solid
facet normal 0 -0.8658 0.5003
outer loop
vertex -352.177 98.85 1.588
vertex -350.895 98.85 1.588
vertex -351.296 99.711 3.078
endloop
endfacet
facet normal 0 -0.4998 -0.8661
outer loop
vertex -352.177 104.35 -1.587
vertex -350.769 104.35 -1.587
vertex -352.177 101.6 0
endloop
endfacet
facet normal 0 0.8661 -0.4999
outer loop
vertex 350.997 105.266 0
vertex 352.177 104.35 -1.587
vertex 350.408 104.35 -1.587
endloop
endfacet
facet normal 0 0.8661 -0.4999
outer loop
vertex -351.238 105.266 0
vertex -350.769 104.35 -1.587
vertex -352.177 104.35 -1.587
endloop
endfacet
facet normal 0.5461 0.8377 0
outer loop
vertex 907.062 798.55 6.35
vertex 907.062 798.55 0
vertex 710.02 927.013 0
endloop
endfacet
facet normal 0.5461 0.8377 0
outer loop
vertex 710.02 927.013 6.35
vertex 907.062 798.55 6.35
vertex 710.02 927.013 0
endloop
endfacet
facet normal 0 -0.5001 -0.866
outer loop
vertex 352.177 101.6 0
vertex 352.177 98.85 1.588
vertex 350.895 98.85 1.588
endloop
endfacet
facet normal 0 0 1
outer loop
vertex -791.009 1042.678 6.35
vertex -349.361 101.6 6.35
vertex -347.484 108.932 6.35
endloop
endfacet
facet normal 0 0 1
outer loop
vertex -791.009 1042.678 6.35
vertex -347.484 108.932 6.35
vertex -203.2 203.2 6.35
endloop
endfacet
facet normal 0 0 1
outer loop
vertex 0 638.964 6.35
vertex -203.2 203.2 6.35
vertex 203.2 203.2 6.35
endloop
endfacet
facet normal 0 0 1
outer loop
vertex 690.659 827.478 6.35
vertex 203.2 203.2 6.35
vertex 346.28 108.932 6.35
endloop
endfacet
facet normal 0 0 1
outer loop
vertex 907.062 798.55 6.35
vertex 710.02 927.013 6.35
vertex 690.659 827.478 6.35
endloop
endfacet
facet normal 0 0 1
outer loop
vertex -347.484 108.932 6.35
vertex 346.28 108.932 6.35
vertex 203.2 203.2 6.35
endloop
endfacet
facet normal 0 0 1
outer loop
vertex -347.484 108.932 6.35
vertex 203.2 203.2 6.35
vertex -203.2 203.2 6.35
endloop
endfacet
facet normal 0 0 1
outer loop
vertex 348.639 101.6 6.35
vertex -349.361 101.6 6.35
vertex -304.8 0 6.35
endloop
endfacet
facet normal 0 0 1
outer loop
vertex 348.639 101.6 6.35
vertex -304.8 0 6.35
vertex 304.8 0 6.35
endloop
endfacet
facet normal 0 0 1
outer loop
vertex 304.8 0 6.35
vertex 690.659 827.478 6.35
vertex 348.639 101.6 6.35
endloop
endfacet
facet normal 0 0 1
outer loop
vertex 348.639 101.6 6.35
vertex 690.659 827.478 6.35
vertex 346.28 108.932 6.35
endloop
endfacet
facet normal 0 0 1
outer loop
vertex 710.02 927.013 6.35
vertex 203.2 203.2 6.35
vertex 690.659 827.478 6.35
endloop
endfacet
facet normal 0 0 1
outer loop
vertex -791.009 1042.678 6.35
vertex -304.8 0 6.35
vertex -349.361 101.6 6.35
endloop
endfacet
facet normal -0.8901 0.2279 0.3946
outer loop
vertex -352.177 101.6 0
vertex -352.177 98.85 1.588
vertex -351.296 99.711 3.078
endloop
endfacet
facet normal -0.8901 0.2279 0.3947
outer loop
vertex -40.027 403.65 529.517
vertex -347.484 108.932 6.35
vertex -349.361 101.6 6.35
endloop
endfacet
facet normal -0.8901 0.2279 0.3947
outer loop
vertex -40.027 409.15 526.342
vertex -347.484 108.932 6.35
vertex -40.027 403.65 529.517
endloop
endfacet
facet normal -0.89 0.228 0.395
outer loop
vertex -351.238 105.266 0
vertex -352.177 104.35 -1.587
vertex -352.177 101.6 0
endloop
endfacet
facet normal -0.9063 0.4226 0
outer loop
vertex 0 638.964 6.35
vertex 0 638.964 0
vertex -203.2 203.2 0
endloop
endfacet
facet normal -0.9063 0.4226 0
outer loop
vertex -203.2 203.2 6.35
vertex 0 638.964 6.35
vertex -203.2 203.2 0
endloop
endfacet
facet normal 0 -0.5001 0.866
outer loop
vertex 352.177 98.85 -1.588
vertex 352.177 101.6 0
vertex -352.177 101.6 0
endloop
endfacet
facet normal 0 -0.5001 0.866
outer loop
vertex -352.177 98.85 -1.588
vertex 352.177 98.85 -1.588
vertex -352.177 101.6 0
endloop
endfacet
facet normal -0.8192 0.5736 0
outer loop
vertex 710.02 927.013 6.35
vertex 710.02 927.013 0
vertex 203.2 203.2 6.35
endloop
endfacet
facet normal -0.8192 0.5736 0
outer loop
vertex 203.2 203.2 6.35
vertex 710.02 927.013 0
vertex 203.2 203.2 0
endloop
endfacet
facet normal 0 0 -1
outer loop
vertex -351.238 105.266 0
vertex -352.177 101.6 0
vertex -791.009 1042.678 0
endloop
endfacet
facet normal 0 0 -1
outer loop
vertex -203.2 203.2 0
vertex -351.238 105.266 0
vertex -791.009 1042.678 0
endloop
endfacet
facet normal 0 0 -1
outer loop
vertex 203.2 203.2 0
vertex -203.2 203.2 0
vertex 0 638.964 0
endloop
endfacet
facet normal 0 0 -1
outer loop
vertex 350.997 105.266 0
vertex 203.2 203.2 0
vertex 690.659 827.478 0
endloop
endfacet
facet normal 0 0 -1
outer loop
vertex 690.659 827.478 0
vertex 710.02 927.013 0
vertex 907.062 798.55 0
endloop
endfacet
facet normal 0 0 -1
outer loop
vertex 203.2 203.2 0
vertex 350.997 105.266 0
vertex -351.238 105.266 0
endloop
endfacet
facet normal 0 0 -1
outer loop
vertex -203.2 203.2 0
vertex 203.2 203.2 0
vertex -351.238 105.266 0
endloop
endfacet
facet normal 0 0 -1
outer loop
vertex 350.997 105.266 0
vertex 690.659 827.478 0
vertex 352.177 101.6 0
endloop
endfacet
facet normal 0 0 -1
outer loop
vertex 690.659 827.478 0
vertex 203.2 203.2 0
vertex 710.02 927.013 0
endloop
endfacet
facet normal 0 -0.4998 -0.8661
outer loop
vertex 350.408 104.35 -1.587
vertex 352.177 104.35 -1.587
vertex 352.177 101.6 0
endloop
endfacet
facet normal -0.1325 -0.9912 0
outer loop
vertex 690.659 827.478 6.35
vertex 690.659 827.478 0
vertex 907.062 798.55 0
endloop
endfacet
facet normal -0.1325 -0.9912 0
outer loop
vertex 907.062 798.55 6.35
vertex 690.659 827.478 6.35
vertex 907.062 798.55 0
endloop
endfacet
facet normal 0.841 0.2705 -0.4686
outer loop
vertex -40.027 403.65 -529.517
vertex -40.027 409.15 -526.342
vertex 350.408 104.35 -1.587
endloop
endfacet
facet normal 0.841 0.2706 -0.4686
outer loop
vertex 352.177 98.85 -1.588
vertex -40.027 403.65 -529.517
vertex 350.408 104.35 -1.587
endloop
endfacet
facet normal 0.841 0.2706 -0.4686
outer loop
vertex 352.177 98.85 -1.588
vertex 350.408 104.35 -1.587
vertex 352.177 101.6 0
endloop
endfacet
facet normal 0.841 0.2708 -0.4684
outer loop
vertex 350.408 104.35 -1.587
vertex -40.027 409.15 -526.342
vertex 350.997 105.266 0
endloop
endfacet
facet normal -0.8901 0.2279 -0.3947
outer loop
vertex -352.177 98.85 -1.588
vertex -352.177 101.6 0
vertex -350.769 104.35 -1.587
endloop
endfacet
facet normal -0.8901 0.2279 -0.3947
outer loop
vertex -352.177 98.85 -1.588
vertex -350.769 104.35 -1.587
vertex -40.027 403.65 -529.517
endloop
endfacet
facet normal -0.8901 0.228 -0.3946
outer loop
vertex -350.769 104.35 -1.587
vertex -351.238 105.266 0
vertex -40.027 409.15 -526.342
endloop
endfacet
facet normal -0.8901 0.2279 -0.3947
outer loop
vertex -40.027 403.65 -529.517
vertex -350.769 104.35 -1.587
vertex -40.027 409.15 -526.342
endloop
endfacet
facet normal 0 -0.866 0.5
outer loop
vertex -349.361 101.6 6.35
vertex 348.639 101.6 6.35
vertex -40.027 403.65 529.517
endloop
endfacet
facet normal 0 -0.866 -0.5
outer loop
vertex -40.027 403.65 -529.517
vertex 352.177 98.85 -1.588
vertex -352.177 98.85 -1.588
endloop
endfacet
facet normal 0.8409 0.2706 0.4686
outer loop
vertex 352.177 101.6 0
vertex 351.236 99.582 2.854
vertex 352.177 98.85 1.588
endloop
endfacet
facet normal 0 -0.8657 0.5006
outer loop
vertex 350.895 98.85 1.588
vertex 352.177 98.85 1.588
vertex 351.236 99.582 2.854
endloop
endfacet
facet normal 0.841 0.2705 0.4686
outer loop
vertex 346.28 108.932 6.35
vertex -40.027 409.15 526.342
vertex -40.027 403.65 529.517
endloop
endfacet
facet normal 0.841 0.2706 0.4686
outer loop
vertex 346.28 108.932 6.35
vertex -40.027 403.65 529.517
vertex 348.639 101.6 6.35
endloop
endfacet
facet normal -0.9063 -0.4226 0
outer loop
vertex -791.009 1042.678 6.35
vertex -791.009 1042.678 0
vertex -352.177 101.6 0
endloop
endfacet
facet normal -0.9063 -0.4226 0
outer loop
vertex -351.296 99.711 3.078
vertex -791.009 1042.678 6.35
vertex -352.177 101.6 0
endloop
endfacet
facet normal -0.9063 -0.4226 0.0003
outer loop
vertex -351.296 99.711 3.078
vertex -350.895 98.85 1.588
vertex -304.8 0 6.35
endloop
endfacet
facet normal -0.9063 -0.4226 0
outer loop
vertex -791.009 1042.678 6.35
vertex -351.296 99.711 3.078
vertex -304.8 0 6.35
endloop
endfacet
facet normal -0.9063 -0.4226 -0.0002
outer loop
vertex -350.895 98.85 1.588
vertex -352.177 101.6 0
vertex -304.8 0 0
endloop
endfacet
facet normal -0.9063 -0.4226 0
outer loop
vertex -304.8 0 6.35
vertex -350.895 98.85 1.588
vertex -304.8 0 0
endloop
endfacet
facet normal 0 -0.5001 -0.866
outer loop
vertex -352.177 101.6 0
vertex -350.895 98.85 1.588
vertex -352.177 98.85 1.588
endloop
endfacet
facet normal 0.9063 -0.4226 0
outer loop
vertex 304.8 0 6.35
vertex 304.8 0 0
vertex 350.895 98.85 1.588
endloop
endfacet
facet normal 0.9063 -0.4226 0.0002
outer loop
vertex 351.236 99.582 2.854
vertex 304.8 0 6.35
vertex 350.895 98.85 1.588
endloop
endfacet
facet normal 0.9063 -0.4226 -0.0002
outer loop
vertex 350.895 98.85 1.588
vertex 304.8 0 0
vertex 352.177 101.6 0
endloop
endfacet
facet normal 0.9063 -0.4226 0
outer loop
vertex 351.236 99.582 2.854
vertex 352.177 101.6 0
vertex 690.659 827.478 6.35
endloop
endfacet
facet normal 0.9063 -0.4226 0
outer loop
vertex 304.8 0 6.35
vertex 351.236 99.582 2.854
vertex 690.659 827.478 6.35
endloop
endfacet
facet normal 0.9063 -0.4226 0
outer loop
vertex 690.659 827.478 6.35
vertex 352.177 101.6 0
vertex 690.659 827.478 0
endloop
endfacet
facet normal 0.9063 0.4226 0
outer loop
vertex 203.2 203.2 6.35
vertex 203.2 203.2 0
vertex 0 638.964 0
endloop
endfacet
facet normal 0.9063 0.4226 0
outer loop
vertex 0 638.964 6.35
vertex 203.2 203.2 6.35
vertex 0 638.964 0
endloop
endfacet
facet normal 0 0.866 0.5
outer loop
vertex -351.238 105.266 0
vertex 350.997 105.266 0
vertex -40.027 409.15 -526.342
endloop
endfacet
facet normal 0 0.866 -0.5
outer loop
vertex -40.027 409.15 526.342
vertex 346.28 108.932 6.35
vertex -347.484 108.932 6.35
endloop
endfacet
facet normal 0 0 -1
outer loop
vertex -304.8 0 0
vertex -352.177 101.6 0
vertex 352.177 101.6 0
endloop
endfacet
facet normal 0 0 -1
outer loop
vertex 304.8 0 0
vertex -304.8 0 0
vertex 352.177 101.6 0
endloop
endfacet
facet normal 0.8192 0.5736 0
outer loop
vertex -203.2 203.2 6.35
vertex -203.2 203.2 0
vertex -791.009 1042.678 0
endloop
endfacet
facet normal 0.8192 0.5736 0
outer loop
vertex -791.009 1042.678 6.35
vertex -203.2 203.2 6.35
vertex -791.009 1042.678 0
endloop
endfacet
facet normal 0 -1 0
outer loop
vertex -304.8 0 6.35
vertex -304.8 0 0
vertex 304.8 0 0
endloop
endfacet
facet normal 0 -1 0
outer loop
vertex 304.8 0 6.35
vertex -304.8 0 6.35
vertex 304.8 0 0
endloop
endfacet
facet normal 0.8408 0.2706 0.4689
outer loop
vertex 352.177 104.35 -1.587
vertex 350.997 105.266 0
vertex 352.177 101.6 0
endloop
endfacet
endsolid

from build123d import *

# Parameters (mm, degrees)
BOSS_EXTRUDE1_DEPTH = 6.35
BOSS_EXTRUDE2_DEPTH = 3.175


with BuildPart() as part:
    # Sketch1 → Boss-Extrude1 (new body)
    with BuildSketch(Plane.XY):
        Polygon((-304.8, 0), (304.8, 0), (690.659261151, 827.477855881), (907.061590086, 798.54952059), (710.019622074, 927.013433042), (203.2, 203.2), (0, 638.963806248), (-203.2, 203.2), (-791.008562204, 1042.677626458), align=None)
    extrude(amount=BOSS_EXTRUDE1_DEPTH)

    # Sketch2 → Boss-Extrude2 (add, symmetric)
    with BuildSketch(Plane(origin=(0, 76.2, 43.994090512), x_dir=(1, 0, 0), z_dir=(0, 0.866025403784438, 0.500000000000001))):
        Polygon((-352.176858069, 50.8), (-40.026997385, 660.4), (352.176858069, 50.8), align=None)
    boss_extrude2 = extrude(amount=BOSS_EXTRUDE2_DEPTH, both=True)

    # Mirror1: Boss-Extrude2 across plane
    add(boss_extrude2.mirror(Plane.XY))


solid = part.part
